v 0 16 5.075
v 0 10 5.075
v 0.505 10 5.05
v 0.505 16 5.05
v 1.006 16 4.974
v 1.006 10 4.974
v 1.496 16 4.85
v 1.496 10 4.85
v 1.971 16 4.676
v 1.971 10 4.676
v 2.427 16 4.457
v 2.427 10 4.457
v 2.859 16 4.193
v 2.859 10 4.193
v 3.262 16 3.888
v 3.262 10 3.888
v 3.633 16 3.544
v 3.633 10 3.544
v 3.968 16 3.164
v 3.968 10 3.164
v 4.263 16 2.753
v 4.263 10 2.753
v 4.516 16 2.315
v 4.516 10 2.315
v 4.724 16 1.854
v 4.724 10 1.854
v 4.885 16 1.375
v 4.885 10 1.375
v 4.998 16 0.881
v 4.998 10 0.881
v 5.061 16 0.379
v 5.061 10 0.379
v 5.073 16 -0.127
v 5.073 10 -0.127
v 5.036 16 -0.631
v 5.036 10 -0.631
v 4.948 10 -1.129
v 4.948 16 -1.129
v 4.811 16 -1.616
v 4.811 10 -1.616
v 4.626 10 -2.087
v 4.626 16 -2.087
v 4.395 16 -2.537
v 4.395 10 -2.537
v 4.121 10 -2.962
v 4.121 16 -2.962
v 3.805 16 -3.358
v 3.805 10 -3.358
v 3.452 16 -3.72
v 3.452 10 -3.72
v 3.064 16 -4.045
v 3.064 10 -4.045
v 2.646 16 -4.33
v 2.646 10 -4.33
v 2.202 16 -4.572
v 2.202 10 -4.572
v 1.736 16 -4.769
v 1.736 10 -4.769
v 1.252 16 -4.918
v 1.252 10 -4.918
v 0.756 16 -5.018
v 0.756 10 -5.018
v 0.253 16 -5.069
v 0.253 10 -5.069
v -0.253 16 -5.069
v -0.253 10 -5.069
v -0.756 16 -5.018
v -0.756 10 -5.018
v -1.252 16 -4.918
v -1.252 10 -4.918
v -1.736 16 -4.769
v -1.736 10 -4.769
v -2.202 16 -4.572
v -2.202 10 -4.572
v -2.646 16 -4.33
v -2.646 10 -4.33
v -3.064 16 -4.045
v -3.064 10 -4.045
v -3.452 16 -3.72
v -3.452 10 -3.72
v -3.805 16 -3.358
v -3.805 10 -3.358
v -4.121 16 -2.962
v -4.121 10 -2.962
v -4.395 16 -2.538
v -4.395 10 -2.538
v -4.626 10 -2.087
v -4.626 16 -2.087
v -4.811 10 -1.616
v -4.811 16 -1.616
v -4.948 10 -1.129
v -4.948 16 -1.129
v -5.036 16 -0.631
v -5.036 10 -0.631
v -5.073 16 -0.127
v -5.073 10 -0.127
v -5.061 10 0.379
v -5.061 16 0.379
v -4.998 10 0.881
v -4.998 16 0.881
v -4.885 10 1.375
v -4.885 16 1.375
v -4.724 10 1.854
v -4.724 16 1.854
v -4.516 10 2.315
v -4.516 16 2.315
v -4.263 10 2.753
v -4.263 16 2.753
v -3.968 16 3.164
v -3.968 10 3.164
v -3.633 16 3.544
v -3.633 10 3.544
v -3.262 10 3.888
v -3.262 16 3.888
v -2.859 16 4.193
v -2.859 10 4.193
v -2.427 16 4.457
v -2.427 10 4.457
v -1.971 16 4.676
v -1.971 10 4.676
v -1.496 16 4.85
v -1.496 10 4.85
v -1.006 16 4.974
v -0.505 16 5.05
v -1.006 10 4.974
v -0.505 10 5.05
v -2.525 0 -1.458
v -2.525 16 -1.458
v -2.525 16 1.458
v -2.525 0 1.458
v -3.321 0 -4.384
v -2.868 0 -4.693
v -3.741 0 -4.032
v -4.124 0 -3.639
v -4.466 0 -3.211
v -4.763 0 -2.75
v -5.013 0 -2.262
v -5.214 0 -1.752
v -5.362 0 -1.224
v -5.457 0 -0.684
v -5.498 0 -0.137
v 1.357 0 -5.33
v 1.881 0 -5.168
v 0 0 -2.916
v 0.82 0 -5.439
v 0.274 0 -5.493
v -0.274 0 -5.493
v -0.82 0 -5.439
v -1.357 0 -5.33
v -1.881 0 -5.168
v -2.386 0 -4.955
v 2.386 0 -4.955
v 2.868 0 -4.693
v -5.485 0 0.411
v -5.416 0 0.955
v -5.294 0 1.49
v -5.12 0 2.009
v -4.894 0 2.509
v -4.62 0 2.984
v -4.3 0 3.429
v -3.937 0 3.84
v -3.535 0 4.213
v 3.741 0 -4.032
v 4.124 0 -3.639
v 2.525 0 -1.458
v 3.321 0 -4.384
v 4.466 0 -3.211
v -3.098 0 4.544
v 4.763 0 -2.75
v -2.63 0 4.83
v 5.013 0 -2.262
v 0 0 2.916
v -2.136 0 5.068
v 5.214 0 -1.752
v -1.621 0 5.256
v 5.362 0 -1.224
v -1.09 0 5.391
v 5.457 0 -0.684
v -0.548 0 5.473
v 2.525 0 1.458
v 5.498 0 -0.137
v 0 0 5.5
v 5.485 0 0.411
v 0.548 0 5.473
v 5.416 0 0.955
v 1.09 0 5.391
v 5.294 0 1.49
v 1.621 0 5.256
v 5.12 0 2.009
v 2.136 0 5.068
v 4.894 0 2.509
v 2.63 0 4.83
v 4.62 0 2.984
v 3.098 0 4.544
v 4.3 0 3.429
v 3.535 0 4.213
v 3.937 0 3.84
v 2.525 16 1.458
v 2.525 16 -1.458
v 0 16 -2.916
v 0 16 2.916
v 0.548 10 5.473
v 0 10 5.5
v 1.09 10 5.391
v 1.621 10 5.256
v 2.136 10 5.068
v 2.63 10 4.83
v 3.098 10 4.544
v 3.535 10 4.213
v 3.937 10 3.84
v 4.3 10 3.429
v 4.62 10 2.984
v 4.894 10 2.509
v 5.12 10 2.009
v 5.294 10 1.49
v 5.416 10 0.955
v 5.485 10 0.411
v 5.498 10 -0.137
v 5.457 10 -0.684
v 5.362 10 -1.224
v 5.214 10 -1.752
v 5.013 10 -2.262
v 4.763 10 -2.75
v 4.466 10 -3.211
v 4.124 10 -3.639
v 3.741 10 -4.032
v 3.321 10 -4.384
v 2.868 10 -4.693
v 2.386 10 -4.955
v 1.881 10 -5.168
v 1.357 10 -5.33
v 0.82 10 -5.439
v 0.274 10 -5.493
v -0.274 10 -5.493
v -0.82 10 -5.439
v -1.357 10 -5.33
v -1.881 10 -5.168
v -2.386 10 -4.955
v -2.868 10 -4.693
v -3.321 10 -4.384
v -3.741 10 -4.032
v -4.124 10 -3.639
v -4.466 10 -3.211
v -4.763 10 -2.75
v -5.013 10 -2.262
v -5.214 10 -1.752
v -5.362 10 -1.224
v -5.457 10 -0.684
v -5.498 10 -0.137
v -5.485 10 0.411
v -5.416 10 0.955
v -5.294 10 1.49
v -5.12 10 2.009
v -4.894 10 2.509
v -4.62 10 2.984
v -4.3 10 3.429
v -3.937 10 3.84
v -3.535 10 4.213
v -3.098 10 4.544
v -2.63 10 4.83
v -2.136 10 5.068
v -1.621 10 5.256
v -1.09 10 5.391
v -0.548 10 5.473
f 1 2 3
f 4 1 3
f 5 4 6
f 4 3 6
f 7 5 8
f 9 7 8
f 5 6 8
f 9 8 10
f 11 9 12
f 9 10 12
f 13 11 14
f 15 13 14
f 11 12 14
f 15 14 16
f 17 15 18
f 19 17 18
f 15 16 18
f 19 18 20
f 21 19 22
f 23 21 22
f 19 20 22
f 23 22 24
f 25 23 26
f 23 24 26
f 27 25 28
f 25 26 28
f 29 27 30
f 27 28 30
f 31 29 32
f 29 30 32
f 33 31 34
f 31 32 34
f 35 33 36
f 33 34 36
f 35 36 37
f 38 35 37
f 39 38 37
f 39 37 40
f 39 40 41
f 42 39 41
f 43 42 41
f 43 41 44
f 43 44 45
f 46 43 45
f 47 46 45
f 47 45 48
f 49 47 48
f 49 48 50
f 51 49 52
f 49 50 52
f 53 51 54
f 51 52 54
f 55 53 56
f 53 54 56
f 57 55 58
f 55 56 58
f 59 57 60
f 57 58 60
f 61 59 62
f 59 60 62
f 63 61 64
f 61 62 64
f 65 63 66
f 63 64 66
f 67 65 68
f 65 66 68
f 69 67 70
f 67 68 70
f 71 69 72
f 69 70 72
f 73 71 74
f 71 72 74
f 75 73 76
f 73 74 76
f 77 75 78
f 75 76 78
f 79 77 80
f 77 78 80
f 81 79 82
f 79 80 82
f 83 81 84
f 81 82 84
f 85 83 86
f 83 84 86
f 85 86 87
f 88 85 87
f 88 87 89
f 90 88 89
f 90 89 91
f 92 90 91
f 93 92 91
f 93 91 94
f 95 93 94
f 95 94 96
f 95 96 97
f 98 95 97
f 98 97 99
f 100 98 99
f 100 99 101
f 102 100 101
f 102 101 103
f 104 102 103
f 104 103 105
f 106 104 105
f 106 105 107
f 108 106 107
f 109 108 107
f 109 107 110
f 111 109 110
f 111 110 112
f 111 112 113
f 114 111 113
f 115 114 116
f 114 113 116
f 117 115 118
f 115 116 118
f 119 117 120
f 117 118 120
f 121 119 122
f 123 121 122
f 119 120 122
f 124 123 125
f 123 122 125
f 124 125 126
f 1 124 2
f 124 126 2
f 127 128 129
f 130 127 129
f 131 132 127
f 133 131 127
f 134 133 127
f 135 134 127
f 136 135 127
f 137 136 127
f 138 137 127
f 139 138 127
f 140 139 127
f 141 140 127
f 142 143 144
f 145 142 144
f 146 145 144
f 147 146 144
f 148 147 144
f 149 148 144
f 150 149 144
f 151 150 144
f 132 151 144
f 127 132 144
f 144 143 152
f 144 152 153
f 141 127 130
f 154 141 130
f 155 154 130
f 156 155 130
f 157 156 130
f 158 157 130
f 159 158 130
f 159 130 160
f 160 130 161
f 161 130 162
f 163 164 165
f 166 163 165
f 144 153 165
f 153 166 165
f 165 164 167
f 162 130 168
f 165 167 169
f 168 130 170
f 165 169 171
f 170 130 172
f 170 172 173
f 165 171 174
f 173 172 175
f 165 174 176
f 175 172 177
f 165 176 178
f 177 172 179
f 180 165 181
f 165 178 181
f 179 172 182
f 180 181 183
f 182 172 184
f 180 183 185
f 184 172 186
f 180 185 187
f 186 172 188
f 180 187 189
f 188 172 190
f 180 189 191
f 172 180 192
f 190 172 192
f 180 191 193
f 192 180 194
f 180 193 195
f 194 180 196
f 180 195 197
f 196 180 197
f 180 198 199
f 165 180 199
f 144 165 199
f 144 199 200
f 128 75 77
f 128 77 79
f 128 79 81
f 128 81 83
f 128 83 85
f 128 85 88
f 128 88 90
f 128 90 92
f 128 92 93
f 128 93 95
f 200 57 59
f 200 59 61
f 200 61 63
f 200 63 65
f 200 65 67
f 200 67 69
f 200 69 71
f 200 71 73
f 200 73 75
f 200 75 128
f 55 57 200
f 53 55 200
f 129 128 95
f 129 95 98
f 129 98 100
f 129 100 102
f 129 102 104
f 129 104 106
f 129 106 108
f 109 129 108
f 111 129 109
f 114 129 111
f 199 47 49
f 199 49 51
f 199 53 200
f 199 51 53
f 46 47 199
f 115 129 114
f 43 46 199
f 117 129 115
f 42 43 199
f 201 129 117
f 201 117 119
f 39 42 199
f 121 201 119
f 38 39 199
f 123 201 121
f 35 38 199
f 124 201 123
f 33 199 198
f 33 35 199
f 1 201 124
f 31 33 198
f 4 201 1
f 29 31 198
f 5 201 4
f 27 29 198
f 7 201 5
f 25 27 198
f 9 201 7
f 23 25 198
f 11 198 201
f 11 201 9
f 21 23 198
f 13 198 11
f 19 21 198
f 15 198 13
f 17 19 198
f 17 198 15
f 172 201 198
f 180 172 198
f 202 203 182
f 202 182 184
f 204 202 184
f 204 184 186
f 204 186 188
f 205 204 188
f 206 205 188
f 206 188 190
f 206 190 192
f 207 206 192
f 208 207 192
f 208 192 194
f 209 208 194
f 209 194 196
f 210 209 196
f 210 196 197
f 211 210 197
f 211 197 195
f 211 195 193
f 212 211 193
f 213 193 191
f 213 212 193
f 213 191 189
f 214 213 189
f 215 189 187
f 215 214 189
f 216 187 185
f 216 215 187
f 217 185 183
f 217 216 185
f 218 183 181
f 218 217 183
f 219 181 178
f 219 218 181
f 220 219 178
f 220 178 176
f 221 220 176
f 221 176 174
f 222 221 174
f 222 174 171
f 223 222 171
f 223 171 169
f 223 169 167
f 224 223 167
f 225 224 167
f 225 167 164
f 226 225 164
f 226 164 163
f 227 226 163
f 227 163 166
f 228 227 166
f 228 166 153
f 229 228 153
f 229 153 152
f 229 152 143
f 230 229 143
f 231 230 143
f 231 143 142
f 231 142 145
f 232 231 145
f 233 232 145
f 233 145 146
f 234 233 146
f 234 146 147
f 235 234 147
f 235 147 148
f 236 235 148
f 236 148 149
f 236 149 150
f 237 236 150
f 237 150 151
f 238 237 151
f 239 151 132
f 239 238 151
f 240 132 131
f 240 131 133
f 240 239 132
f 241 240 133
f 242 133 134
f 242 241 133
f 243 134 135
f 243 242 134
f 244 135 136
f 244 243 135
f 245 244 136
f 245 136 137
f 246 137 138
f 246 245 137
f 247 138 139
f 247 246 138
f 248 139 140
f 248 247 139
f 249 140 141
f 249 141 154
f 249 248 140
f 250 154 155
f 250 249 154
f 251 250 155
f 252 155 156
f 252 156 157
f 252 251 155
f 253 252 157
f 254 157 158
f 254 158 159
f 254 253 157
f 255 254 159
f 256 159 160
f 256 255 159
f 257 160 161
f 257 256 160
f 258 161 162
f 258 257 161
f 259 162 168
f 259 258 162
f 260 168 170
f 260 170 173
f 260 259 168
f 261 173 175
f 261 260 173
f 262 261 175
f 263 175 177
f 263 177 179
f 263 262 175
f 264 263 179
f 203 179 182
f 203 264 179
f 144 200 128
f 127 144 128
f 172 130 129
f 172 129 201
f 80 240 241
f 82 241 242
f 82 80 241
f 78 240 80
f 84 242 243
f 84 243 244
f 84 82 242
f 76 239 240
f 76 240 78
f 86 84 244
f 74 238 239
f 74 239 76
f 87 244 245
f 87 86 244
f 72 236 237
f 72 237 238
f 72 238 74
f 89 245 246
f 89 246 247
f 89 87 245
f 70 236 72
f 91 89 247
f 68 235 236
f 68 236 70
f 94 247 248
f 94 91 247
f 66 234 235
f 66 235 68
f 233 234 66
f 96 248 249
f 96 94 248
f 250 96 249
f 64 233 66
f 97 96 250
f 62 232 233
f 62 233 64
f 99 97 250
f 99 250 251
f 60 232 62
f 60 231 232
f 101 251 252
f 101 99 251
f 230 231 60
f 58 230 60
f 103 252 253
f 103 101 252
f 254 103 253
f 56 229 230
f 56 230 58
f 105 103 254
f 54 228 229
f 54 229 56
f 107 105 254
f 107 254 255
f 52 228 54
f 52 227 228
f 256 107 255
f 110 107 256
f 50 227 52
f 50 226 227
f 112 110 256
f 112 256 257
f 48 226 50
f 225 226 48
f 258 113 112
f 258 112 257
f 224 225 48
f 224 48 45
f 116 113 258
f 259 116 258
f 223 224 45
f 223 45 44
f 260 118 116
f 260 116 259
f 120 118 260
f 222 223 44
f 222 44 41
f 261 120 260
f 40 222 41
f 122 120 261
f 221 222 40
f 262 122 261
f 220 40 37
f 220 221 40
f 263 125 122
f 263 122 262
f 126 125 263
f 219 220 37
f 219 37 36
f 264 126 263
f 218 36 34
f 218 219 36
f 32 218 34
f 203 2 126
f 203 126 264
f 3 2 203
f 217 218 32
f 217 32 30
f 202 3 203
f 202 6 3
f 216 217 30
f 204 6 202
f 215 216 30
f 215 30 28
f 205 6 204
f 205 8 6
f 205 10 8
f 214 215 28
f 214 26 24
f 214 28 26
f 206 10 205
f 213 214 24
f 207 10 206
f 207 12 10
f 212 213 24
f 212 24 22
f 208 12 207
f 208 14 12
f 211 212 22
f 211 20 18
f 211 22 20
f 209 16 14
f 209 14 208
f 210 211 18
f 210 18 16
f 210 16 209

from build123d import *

# Parameters (mm, degrees)
SKETCH1_R           = 7
BOSS_EXTRUDE1_DEPTH = 10
SKETCH2_R           = 5.075
BOSS_EXTRUDE2_DEPTH = 6
CUT_EXTRUDE2_DEPTH  = 19.814887722
SKETCH5_OUTSIDE_W   = 21.092
SKETCH5_OUTSIDE_H   = 21.092
SKETCH5_OUTSIDE_R   = 5.5
CUT_EXTRUDE3_DEPTH  = 15.071247279


with BuildPart() as part:
    # Sketch1 → Boss-Extrude1 (new body)
    with BuildSketch(Plane(origin=(0, 0, 0), x_dir=(1, 0, 0), z_dir=(0, 1, 0))):
        with Locations(Location((0, 0, 0), (0, 0, 270))):
            Circle(SKETCH1_R)
    extrude(amount=BOSS_EXTRUDE1_DEPTH)

    # Sketch2 → Boss-Extrude2 (add)
    with BuildSketch(Plane(origin=(0, 10, 0), x_dir=(1, 0, 0), z_dir=(0, 1, 0))):
        with Locations(Location((0, 0, 0), (0, 0, 270))):
            Circle(SKETCH2_R)
    extrude(amount=BOSS_EXTRUDE2_DEPTH)

    # Sketch4 → Cut-Extrude2 (cut, through all)
    with BuildSketch(Plane(origin=(0, 16, 0), x_dir=(1, 0, 0), z_dir=(0, 1, 0))):
        Polygon((2.525, 1.45780943), (0, 2.915618859), (-2.525, 1.45780943), (-2.525, -1.45780943), (0, -2.915618859), (2.525, -1.45780943), align=None)
    extrude(amount=-CUT_EXTRUDE2_DEPTH, mode=Mode.SUBTRACT)

    # Sketch5 outside → Cut-Extrude3 (cut, through all)
    with BuildSketch(Plane(origin=(0, 10, 0), x_dir=(1, 0, 0), z_dir=(0, 1, 0))):
        Rectangle(SKETCH5_OUTSIDE_W, SKETCH5_OUTSIDE_H)
        with Locations(Location((0, 0, 0), (0, 0, 270))):
            Circle(SKETCH5_OUTSIDE_R, mode=Mode.SUBTRACT)
    extrude(amount=-CUT_EXTRUDE3_DEPTH, mode=Mode.SUBTRACT)


solid = part.part
